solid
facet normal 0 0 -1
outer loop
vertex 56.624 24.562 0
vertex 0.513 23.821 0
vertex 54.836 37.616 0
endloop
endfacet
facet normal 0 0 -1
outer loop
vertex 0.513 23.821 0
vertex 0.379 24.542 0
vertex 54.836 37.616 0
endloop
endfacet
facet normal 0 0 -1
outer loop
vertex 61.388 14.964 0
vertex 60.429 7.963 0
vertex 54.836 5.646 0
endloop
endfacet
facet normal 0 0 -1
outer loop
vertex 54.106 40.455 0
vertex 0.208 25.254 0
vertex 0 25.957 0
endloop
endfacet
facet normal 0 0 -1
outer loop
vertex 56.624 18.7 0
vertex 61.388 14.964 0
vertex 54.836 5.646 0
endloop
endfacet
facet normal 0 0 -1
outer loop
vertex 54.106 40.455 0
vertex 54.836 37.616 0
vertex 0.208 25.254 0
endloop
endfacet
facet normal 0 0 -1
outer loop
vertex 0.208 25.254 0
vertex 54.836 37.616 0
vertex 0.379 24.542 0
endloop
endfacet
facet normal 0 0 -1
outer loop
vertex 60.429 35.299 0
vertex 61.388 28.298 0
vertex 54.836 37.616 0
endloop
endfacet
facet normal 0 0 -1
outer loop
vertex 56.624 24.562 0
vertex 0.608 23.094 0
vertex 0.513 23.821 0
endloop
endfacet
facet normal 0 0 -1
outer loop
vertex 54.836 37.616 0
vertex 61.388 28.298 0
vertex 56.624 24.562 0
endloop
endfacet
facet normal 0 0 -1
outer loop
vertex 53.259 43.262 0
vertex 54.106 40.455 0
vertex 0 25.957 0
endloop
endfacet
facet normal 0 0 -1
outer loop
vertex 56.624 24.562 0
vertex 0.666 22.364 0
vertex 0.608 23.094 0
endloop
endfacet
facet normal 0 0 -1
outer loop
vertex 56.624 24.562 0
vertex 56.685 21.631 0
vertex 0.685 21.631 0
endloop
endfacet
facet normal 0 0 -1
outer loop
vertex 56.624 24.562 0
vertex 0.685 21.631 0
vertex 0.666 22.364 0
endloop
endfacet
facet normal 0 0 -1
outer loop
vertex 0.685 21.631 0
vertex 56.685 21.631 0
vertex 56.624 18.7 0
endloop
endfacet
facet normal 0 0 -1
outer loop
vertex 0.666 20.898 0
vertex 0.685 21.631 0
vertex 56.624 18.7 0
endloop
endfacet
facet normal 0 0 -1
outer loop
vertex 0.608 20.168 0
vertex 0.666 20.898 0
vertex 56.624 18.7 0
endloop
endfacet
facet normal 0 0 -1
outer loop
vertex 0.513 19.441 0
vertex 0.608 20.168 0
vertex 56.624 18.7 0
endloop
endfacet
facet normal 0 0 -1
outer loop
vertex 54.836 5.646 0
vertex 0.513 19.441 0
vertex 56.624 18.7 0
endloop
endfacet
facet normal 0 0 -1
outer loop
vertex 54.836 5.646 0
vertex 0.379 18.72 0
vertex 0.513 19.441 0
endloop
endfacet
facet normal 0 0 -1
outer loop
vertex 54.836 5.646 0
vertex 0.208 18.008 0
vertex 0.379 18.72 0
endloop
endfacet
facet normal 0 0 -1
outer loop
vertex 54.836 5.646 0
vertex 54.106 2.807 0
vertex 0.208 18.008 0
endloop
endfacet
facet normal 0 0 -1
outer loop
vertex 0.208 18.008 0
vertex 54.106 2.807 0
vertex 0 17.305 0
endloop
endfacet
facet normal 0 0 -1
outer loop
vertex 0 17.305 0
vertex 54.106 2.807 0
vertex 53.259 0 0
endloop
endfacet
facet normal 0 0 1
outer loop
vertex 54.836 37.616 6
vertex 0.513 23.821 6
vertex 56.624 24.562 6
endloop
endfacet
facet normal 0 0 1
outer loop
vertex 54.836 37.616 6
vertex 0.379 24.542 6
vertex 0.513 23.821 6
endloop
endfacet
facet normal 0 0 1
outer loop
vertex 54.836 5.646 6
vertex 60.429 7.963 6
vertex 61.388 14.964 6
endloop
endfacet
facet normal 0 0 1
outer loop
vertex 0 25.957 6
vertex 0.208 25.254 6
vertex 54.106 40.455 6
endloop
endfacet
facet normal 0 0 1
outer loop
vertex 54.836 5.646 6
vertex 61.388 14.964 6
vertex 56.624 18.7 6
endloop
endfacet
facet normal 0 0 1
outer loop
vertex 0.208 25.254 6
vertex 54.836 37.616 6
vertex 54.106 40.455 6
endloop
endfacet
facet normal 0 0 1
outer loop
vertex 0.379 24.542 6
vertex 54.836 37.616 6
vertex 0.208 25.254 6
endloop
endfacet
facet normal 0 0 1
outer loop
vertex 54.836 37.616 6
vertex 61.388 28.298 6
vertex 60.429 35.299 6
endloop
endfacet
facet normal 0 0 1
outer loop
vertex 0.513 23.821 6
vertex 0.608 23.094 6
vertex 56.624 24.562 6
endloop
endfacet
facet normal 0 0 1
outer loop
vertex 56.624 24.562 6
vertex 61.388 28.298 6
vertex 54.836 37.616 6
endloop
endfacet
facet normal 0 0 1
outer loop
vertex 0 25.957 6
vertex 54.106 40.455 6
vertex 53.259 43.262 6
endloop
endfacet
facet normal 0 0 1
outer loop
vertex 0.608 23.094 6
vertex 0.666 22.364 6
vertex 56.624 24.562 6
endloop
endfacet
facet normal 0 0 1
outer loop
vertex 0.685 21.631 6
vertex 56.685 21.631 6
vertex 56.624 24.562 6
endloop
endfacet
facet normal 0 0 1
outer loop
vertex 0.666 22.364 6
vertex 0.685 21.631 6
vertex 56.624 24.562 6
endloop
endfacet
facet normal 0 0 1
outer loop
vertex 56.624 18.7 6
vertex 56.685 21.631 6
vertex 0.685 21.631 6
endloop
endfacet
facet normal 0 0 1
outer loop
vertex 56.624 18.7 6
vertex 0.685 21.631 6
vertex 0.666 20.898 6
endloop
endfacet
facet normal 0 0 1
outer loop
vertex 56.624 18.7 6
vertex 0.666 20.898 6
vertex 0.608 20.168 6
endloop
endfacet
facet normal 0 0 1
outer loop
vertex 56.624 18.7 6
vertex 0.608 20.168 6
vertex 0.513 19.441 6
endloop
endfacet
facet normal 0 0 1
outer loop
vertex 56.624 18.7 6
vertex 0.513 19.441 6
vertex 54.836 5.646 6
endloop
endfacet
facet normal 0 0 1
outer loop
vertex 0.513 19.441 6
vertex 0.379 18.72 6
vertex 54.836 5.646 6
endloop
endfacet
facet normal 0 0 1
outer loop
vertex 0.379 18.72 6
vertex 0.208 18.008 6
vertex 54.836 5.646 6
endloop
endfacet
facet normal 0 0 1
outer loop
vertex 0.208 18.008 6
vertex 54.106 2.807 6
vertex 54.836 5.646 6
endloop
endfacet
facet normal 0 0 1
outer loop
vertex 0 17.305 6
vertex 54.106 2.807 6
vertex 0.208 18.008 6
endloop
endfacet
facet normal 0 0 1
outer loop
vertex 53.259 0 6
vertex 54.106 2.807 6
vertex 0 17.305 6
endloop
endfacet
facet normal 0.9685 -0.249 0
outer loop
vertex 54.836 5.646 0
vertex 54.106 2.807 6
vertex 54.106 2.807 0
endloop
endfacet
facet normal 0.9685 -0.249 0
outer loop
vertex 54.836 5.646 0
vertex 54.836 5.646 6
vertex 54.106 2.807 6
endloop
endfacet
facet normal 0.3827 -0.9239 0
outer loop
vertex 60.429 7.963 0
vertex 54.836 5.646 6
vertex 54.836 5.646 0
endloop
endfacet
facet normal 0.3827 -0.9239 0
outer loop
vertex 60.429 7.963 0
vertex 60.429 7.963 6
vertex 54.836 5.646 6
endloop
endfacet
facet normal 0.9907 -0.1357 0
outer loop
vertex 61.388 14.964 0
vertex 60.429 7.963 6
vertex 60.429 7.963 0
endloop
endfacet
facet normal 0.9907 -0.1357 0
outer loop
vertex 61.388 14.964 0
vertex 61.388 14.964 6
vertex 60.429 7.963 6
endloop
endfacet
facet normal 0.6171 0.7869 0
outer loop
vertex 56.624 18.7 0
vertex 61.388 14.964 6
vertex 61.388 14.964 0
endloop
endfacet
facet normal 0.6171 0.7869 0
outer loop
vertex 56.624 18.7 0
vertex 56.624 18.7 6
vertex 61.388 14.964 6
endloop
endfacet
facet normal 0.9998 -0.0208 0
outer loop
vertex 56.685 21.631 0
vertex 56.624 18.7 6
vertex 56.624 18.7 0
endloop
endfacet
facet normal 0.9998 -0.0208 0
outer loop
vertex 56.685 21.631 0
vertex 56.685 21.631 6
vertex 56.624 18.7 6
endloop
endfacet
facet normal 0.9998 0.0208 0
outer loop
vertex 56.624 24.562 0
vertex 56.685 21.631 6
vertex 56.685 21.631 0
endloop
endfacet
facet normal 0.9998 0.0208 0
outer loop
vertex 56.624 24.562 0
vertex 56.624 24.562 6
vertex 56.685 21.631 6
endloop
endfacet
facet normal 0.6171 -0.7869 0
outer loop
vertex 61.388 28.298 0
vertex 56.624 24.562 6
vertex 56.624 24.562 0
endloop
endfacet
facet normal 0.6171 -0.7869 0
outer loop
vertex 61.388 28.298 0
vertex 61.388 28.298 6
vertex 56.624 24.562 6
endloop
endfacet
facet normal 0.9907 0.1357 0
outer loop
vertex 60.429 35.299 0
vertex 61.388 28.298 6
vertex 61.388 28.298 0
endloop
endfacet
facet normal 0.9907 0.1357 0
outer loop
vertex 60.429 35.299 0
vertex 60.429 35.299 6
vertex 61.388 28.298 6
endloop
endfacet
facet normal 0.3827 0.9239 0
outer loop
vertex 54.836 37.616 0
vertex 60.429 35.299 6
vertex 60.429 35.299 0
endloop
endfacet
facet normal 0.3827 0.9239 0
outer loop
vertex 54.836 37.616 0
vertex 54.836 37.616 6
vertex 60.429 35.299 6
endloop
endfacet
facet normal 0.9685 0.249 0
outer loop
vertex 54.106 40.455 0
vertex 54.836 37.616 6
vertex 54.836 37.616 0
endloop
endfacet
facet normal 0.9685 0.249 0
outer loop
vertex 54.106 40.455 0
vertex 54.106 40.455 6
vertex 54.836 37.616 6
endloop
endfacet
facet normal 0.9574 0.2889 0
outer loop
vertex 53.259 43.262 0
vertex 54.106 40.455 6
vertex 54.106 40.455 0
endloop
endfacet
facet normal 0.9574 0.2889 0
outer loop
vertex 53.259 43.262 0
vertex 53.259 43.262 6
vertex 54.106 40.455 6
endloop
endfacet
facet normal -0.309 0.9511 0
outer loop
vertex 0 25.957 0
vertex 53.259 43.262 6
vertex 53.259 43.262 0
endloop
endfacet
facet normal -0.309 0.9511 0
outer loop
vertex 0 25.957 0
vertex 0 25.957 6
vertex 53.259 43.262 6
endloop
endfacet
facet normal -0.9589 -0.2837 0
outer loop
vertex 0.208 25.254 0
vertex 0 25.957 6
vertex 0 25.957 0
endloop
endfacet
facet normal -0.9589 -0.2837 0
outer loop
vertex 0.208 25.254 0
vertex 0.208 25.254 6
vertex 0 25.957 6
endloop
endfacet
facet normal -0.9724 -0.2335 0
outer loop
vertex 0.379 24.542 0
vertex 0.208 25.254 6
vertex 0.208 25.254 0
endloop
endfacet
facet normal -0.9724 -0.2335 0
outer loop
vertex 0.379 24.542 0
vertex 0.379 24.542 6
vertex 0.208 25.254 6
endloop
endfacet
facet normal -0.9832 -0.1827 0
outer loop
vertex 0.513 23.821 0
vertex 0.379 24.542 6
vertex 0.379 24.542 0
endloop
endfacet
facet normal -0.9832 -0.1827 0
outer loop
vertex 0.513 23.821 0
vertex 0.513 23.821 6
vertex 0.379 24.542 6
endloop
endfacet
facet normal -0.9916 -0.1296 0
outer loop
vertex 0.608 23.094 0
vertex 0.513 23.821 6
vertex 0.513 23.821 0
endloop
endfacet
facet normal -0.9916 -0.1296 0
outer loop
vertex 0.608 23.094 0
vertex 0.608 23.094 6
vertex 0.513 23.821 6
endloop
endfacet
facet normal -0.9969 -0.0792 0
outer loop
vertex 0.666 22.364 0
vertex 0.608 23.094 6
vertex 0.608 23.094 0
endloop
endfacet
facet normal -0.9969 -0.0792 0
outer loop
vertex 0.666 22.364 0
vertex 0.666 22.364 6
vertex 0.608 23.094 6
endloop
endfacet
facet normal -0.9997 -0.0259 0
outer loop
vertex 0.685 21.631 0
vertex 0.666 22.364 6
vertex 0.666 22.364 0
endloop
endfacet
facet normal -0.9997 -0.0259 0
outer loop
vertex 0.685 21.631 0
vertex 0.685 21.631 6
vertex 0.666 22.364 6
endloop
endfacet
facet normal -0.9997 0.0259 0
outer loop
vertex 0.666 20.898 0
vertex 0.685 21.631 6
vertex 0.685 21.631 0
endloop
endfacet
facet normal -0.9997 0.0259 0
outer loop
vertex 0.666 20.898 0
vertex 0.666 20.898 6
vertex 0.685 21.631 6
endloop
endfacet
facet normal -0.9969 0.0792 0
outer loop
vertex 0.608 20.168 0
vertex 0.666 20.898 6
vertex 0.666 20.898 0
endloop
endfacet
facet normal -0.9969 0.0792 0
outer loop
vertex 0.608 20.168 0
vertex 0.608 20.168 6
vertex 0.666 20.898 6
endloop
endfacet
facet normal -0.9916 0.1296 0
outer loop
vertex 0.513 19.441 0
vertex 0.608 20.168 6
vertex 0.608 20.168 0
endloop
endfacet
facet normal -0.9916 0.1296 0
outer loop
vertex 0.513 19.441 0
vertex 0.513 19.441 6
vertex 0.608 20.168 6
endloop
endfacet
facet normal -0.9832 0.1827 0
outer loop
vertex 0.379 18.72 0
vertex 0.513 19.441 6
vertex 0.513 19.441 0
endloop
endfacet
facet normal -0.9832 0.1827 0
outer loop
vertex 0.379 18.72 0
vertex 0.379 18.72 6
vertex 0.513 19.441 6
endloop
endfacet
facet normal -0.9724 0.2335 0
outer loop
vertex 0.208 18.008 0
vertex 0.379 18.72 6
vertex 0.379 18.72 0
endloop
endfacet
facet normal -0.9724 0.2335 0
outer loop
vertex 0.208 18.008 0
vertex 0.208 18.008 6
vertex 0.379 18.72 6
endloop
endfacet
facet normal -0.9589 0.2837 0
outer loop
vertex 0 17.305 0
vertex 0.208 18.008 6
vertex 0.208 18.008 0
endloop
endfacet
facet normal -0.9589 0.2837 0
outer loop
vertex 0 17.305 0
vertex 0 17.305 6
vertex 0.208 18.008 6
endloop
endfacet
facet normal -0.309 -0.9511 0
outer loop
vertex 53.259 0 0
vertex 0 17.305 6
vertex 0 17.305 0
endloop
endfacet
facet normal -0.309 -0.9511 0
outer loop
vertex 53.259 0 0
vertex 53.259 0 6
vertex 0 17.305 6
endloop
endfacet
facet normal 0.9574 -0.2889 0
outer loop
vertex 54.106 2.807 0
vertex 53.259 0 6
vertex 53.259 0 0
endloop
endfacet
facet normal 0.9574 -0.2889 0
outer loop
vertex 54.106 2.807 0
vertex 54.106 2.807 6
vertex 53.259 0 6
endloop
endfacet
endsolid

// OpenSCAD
$fn = 32;

// ----------------------------------------------------------------------
// Gear sector: 2 teeth on 36 degrees
// ----------------------------------------------------------------------

// --- parameters (mm) ---
sector_angle = 36;        // sector angle, degrees
root_r = 70;              // root circle radius
tooth_h = 5;              // tooth height over the root circle
teeth = 2;                // number of teeth on the sector
hub_r = 14;               // hub bore radius
plate_t = 6;              // sector thickness, Z
arc_step = 3;             // sampling step of the root/hub arcs, degrees

tip_r = root_r + tooth_h;  // tip circle radius

profile = [[53.259, 0], [54.106, 2.807], [54.836, 5.646], [60.429, 7.963], [61.388, 14.964], [56.624, 18.7], [56.685, 21.631], [56.624, 24.562], [61.388, 28.298], [60.429, 35.299], [54.836, 37.616], [54.106, 40.455], [53.259, 43.262], [0, 25.957], [0.208, 25.254], [0.379, 24.542], [0.513, 23.821], [0.608, 23.094], [0.666, 22.364], [0.685, 21.631], [0.666, 20.898], [0.608, 20.168], [0.513, 19.441], [0.379, 18.72], [0.208, 18.008], [0, 17.305]];  // primary outline, 26 points, counter clockwise

// --- the one profile operation ---
linear_extrude(height = plate_t) polygon(points = profile);
